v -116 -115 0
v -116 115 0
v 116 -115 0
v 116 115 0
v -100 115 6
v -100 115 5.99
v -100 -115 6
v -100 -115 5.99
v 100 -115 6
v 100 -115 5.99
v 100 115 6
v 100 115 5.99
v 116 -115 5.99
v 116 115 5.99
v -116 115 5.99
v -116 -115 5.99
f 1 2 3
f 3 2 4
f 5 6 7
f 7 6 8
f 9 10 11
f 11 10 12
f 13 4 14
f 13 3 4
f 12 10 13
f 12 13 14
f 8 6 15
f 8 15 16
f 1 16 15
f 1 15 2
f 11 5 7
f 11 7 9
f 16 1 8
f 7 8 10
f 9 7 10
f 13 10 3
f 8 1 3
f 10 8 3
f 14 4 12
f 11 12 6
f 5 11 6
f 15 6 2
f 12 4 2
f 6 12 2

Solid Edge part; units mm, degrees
sketch "Sketch1" plane through (0, 0, 0) normal (0, 0, 1) x (1, 0, 0)
  line L0 (-100, -115) -> (100, -115)
  line L1 (100, -115) -> (100, 115)
  line L2 (100, 115) -> (-100, 115)
  line L3 (-100, 115) -> (-100, -115)
  dimension "D1" = 200
  dimension "D2" = 230
extrude "Protrusion1" add sketch "Sketch1" along normal blind 6
sketch "Sketch2" plane through (-100, 0, 3) normal (-1, 0, 0) x (0, -1, 0)
  line L0 (-115, -3) -> (115, -3)
  line L1 (115, 2.99) -> (115, -3)
  line L2 (-115, 2.99) -> (115, 2.99)
  line L3 (-115, 2.99) -> (-115, -3)
  dimension "D1" = 0.01
extrude "ExtrudedProtrusion_2" add sketch "Sketch2" along normal blind 16
mirror "Mirror1" about plane through (0, 0, 0) normal (1, 0, 0) of "ExtrudedProtrusion_2"
